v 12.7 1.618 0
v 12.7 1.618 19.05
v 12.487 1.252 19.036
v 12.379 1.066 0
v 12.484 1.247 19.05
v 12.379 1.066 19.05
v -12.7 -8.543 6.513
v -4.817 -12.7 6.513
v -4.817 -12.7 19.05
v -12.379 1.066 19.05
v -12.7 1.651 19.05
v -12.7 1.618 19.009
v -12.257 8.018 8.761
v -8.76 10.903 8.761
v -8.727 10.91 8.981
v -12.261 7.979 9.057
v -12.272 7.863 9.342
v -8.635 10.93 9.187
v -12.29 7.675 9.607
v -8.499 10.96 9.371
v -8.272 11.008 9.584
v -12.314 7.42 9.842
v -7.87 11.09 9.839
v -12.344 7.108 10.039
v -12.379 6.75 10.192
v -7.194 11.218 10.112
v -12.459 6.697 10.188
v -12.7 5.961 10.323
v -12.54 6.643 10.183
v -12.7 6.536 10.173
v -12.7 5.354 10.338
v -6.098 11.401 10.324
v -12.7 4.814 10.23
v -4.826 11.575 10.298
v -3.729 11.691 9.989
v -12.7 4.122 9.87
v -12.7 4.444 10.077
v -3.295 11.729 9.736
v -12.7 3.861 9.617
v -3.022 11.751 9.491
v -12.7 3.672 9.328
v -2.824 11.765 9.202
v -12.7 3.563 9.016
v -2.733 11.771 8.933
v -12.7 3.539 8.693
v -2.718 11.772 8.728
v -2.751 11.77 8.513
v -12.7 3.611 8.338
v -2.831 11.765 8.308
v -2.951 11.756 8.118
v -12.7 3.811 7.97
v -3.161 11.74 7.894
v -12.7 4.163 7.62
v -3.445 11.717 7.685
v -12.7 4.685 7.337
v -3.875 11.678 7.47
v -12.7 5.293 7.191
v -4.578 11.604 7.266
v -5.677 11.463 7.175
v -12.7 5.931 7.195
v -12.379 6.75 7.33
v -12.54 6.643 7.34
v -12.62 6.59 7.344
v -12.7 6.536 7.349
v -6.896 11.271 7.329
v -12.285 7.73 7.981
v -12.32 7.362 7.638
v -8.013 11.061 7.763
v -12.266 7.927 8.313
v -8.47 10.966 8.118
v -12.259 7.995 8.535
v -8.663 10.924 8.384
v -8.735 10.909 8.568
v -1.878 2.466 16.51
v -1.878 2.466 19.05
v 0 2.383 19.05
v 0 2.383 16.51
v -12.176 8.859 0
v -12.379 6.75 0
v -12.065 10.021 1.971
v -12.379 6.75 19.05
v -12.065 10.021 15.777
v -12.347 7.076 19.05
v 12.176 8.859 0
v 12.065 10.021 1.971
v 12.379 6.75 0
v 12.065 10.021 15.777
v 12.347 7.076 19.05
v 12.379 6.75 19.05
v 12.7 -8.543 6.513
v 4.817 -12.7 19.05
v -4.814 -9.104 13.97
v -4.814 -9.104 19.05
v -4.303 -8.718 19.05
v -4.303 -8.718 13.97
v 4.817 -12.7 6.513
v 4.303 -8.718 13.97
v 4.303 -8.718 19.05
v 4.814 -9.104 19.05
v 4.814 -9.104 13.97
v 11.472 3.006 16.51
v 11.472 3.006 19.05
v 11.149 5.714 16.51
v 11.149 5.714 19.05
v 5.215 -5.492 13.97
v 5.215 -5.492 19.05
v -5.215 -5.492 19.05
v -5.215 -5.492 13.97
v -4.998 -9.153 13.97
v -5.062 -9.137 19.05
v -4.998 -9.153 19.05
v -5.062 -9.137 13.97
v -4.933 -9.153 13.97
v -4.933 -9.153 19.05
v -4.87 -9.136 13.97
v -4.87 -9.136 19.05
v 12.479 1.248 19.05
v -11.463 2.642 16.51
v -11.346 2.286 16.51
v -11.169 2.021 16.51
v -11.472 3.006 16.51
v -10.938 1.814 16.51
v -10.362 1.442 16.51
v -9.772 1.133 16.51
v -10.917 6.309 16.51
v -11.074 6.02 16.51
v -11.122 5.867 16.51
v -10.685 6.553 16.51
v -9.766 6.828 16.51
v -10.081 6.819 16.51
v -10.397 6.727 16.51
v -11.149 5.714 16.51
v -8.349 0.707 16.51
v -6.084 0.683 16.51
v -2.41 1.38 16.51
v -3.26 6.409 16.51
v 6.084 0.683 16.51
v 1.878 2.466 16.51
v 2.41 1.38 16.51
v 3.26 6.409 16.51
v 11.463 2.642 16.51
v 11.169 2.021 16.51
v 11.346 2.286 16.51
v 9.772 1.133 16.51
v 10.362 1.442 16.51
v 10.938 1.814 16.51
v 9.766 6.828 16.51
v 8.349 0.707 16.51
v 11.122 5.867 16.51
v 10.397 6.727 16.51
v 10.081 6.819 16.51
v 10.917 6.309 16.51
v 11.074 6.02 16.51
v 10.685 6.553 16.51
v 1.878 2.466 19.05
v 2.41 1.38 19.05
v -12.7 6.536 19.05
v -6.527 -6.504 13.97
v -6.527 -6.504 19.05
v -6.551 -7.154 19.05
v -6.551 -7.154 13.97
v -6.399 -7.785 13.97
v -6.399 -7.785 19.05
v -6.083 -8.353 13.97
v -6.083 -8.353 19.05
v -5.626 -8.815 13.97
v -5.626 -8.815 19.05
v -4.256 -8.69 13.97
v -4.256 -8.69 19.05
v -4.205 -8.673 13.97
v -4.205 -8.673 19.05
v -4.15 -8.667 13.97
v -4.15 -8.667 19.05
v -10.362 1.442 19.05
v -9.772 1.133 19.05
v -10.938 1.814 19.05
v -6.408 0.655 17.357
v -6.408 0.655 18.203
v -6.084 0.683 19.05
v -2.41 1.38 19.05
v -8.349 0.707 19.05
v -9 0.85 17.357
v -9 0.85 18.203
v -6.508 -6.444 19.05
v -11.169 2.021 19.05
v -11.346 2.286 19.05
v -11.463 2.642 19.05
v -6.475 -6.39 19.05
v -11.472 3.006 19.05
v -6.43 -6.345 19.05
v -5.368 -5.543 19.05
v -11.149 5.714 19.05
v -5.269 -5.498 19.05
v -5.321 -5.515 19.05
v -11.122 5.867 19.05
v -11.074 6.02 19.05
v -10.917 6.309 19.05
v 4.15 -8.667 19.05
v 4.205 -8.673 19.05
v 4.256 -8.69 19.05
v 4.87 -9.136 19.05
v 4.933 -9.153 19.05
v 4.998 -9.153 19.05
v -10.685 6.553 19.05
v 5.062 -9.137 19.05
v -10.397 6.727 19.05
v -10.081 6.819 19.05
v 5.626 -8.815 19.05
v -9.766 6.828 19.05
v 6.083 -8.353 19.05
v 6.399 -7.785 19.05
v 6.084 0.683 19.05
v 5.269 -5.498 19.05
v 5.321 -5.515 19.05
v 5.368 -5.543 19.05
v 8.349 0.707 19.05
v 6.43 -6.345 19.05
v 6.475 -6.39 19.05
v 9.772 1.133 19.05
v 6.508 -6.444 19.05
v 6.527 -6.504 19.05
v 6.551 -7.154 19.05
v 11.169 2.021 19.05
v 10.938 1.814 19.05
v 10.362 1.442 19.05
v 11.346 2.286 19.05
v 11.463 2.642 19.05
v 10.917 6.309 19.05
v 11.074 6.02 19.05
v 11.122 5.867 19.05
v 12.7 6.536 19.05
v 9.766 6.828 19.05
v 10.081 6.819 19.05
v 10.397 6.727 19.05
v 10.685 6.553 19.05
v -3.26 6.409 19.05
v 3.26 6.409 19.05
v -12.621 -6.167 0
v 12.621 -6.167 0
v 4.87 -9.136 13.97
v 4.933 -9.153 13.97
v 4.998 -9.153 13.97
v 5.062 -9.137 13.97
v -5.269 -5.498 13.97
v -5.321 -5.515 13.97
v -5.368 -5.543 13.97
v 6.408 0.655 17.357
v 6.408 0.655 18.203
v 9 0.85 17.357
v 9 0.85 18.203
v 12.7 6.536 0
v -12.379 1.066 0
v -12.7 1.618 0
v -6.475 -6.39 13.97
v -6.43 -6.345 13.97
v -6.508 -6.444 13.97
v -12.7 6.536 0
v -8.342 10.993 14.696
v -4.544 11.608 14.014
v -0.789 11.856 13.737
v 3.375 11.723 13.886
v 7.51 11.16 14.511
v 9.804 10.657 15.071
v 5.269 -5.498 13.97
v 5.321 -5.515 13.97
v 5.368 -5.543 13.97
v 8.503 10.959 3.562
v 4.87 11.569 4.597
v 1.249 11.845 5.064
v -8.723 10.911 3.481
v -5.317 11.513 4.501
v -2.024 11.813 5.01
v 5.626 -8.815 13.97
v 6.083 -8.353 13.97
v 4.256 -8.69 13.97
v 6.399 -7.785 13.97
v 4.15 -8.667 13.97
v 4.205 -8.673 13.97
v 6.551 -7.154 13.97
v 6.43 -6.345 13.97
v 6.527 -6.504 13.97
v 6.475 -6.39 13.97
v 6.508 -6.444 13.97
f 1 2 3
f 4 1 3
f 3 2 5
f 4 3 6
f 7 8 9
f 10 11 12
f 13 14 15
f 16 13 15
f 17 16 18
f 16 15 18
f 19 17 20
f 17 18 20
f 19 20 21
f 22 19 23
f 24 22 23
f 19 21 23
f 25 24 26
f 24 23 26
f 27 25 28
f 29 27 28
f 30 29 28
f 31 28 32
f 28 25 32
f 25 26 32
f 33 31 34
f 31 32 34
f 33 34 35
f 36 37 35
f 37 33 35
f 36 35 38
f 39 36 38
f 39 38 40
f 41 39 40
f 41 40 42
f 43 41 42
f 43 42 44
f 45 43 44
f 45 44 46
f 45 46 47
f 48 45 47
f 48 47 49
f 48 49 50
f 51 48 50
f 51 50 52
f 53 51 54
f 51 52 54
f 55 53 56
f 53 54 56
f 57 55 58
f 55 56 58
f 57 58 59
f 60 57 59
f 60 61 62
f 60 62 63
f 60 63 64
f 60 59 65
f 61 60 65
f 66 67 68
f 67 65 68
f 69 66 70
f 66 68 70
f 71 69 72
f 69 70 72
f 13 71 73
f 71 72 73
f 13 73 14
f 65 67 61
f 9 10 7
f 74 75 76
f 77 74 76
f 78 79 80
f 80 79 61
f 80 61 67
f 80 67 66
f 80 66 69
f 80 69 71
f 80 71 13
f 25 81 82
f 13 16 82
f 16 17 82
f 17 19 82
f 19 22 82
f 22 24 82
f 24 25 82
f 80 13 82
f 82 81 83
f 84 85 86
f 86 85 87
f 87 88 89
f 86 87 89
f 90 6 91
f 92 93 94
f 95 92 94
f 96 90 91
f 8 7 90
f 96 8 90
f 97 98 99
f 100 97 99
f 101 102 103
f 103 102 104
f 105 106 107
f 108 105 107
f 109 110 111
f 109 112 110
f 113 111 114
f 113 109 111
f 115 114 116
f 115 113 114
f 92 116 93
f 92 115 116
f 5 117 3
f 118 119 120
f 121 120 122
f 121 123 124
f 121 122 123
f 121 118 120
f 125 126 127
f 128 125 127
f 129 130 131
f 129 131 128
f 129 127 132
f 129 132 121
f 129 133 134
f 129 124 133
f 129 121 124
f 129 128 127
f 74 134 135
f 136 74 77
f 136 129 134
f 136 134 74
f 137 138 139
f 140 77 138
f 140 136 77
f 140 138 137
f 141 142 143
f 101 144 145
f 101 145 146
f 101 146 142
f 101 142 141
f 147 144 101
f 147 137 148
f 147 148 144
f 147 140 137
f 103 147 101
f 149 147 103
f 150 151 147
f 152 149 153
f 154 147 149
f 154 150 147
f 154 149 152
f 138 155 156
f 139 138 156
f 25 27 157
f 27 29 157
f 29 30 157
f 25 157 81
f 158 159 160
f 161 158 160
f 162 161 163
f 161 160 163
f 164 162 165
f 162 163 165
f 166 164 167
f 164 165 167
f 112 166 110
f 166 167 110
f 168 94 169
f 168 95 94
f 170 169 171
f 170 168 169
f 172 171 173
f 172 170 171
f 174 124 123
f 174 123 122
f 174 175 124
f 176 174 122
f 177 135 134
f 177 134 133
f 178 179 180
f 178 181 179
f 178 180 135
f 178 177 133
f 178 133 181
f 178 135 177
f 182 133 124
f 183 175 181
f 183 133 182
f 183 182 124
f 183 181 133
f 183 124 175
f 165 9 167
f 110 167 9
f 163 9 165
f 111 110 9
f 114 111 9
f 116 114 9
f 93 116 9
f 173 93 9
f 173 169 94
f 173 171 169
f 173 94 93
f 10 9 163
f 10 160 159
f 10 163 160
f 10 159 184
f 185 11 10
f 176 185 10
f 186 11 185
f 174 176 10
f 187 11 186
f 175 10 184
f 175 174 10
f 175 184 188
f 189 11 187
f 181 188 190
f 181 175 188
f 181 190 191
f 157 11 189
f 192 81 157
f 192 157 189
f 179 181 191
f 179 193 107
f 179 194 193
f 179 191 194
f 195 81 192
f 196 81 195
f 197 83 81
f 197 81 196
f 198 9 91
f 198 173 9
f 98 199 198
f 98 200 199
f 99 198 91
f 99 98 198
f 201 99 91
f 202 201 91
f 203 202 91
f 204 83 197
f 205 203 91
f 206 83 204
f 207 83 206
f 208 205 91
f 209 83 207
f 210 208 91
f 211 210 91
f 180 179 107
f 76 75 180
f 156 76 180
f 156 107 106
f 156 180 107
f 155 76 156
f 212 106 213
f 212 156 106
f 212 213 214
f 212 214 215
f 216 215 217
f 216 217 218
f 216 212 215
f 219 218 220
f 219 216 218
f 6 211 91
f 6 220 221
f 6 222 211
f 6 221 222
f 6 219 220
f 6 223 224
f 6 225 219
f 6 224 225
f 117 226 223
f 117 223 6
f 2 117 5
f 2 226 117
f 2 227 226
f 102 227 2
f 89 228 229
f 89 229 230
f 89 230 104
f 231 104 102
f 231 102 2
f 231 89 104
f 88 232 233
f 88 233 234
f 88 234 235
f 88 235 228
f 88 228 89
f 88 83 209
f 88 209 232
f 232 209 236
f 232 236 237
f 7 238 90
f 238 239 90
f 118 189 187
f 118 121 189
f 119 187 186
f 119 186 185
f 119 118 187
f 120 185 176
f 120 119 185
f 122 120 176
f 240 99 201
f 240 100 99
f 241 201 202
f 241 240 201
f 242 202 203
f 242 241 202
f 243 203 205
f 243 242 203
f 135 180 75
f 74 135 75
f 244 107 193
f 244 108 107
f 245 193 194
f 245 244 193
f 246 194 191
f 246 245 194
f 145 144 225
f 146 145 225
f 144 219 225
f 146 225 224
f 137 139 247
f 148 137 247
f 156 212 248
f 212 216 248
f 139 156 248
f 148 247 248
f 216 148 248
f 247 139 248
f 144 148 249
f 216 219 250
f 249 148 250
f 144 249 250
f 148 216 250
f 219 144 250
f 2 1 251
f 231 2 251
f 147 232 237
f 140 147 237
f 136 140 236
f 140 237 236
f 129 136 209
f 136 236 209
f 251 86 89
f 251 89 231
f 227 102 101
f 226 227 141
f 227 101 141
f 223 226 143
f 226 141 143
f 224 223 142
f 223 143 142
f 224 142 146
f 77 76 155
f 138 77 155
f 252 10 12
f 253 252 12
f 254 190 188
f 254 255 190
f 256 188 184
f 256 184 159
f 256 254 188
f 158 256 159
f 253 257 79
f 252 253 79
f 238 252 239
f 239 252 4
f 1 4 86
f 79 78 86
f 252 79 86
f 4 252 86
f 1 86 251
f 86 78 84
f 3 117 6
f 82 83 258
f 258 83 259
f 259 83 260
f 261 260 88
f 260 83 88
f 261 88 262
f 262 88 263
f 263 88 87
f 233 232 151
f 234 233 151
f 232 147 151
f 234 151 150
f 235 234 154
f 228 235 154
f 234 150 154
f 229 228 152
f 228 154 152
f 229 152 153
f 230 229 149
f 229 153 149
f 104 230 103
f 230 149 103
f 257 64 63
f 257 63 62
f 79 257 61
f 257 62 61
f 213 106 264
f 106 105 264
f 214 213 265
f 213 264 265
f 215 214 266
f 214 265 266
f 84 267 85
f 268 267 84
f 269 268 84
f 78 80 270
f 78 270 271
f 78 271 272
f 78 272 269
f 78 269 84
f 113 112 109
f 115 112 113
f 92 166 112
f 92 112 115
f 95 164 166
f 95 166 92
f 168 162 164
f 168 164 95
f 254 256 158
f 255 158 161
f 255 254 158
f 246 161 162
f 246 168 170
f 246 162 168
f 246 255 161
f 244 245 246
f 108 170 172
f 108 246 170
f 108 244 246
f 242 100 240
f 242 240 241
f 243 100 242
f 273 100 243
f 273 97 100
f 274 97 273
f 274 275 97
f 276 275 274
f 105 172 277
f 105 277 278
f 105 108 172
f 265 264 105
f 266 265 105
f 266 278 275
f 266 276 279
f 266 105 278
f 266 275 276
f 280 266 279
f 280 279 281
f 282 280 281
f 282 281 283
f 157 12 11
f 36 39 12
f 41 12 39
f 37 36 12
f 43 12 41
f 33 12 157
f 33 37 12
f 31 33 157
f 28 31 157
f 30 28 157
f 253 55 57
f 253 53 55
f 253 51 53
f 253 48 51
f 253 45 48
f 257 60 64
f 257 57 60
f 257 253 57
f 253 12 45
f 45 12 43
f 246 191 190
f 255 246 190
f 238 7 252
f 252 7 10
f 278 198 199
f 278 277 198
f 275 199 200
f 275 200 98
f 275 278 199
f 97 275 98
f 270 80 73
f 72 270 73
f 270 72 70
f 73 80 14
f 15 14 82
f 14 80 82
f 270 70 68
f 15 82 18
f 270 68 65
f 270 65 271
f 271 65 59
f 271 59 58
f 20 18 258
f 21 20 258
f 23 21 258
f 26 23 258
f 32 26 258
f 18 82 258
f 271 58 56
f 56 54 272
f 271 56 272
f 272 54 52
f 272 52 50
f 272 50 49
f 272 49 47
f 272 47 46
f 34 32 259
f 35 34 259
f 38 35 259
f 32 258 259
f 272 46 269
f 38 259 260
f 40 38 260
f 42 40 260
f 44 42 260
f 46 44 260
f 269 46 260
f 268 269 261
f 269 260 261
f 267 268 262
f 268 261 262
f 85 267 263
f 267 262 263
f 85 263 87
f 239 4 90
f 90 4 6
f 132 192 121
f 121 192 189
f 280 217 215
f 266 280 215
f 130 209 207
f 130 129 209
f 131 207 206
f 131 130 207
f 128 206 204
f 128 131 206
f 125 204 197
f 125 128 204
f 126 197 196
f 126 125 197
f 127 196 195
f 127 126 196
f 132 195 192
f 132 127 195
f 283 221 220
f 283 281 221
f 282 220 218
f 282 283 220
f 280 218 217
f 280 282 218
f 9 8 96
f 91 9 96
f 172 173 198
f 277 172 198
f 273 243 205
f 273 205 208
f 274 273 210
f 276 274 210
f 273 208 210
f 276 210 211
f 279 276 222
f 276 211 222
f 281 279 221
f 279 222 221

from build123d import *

# Parameters (mm, degrees)
F0_W      = 25.4
F0_H      = 25.4
F1_DEPTH  = 19.05
F2_W      = 33.1137652975
F2_H      = 28.659734875
F3_DEPTH  = 19.051
F5_DEPTH  = 12.7
F7_DEPTH  = 2.54
F9_DEPTH  = 12.7
F12_DEPTH = 25.4
F15_DEPTH = 25.4
F17_DEPTH = 5.08
F18_R     = 1.27
F20_R     = 1.5875
F21_DEPTH = 12.7
F22_R     = 0.254


with BuildPart() as f1:
    # F0 (on Top) → F1 (new body)
    with BuildSketch(Plane.XY):
        Rectangle(F0_W, F0_H)
    extrude(amount=F1_DEPTH)

    # F2 (on face) → F3 (cut, through all)
    with BuildSketch(Plane.XY.offset(19.05)):
        with Locations((-1.1700320756, 0)):
            Rectangle(F2_W, F2_H)
        with BuildLine():
            ThreePointArc((-12.065, 10.0208269432), (0, 11.8638118431), (12.065, 10.0208269432))
            Line((12.065, 10.0208269432), (12.3786535114, 6.750300061))
            Line((12.3786535114, 6.750300061), (12.7, 6.5362956375))
            Line((12.7, 6.5362956375), (12.7, 1.6182865947))
            Line((12.7, 1.6182865947), (12.3786535114, 1.0663146386))
            Line((12.3786535114, 1.0663146386), (12.7, -8.5426112637))
            Line((12.7, -8.5426112637), (4.8173773102, -12.7))
            Line((4.8173773102, -12.7), (0, -12.7))
            Line((0, -12.7), (-4.8173773102, -12.7))
            Line((-4.8173773102, -12.7), (-12.7, -8.5426112637))
            Line((-12.7, -8.5426112637), (-12.3786535114, 1.0663146386))
            Line((-12.3786535114, 1.0663146386), (-12.7, 1.6182865947))
            Line((-12.7, 1.6182865947), (-12.7, 6.5362956375))
            Line((-12.7, 6.5362956375), (-12.3786535114, 6.750300061))
            Line((-12.3786535114, 6.750300061), (-12.065, 10.0208269432))
        make_face(mode=Mode.SUBTRACT)
    extrude(amount=-F3_DEPTH, mode=Mode.SUBTRACT)

    # F4 (on Right) → F5 (cut, symmetric)
    with BuildSketch(Plane.YZ):
        Polygon((13.4258409962, 23.2345554978), (6.619815249, 19.5569172502), (12.7253746614, 12.7713512629), align=None)
    extrude(amount=F5_DEPTH, both=True, mode=Mode.SUBTRACT)

    # F6 (on face) → F7 (cut)
    with BuildSketch(Plane.XY.offset(19.05)):
        with BuildLine():
            ThreePointArc((11.0015488178, 6.9544261182), (0, 6.3570296668), (-11.0015488178, 6.9544261182))
            Line((-11.0015488178, 6.9544261182), (-11.1053383224, 6.0839187998))
            Line((-11.1053383224, 6.0839187998), (-11.5596242249, 2.2737146355))
            add(Edge.make_bspline(
                [(-2.4099256195, 1.3795604811), (-7.9047118703, 0.0093029614), (-9.4140619773, 0.61575824), (-11.5596242249, 2.2737146355)],
                knots=[0, 0, 0, 0, 0.380461969, 0.380461969, 0.380461969, 0.380461969], degree=3))
            Line((-2.4099256195, 1.3795604811), (-1.8782533274, 2.4663225251))
            Line((-1.8782533274, 2.4663225251), (0, 2.3830392409))
            Line((0, 2.3830392409), (1.8782533274, 2.4663225251))
            Line((1.8782533274, 2.4663225251), (2.4099256195, 1.3795604811))
            add(Edge.make_bspline(
                [(2.4099256195, 1.3795604811), (7.9047118703, 0.0093029614), (9.4140619773, 0.61575824), (11.5596242249, 2.2737146355)],
                knots=[0, 0, 0, 0, 0.380461969, 0.380461969, 0.380461969, 0.380461969], degree=3))
            Line((11.5596242249, 2.2737146355), (11.1053383224, 6.0839187998))
            Line((11.1053383224, 6.0839187998), (11.0015488178, 6.9544261182))
        make_face()
    extrude(amount=-F7_DEPTH, mode=Mode.SUBTRACT)

    # F8 (on Right) → F9 (cut, symmetric)
    with BuildSketch(Plane.YZ):
        Polygon((16.2616688758, -2.9984780122), (12.367782183, 5.9512541629), (7.8229103237, -1.7573904479), align=None)
        Polygon((-14.0263205394, -2.3636263795), (-5.847228691, -0.8765184903), (-8.5426112637, 6.5125478432), (-13.6080719531, 6.5125478432), align=None)
    extrude(amount=F9_DEPTH, both=True, mode=Mode.SUBTRACT)

    # F11 (on 3pt) → F12 (cut)
    with BuildSketch(Plane(origin=(13.5235138631, -7.4279156196, 6.0395065555), x_dir=(-0.409334057, -0.8938834922, -0.1828057224), z_dir=(-0.8161889166, 0.4482993446, -0.3645042525))):
        Polygon((9.3890596181, -6.6504105926), (10.8706550673, 19.4640029222), (-6.7497892305, 22.2047120333), (-12.2956875712, 3.634221619), (-6.1068134382, -4.8245443031), align=None)
    extrude(amount=-F12_DEPTH, mode=Mode.SUBTRACT)

    # F14 (on 3pt) → F15 (cut)
    with BuildSketch(Plane(origin=(-13.5235138631, -7.4279156196, 6.0395065555), x_dir=(0.409334057, -0.8938834922, -0.1828057224), z_dir=(-0.8161889166, -0.4482993446, 0.3645042525))):
        Polygon((12.0957437903, 22.2065132111), (-11.2094106153, 21.0766065866), (-8.9160036296, -5.990778096), (12.0957437903, -5.990778096), align=None)
    extrude(amount=F15_DEPTH, mode=Mode.SUBTRACT)

    # F16 (on face) → F17 (cut)
    with BuildSketch(Plane.XY.offset(19.05)):
        with BuildLine():
            Line((5.2999914624, -5.4918094538), (0, -5.4918094538))
            Line((0, -5.4918094538), (-5.2999914624, -5.4918094538))
            Line((-5.2999914624, -5.4918094538), (-6.5067803222, -6.403681509))
            ThreePointArc((-6.5067803222, -6.403681509), (-6.2496472485, -8.0992009526), (-4.9241394059, -9.1872876037))
            Line((-4.9241394059, -9.1872876037), (-4.2353287011, -8.6668094538))
            Line((-4.2353287011, -8.6668094538), (0, -8.6668094538))
            Line((0, -8.6668094538), (4.2353287011, -8.6668094538))
            Line((4.2353287011, -8.6668094538), (4.9241394059, -9.1872876037))
            ThreePointArc((4.9241394059, -9.1872876037), (6.2496472485, -8.0992009526), (6.5067803222, -6.403681509))
            Line((6.5067803222, -6.403681509), (5.2999914624, -5.4918094538))
        make_face()
    extrude(amount=-F17_DEPTH, mode=Mode.SUBTRACT)

    # F18
    f18_edges = [f1.edges().sort_by_distance(p)[0] for p in [
        (-11.001549, 6.954426, 17.78),
        (11.001549, 6.954426, 17.78),
        (11.559624, 2.273715, 17.78),
        (-11.559624, 2.273715, 17.78),
    ]]
    fillet(f18_edges, radius=F18_R)

    # F20 (on face) → F21 (cut, symmetric)
    with BuildSketch(Plane(origin=(-4.0520275589, -3.3428374331, 0), x_dir=(-0.6363732922, 0.7713812501, 0), z_dir=(0.7713812501, 0.6363732922, 0))):
        with Locations((12.3976198956, 8.7611014023)):
            Circle(F20_R)
    extrude(amount=F21_DEPTH, both=True, mode=Mode.SUBTRACT)

    # F22
    f22_edges = [f1.edges().sort_by_distance(p)[0] for p in [
        (-4.235329, -8.666809, 16.51),
        (-4.924139, -9.187288, 16.51),
        (-6.50678, -6.403682, 16.51),
        (-5.299991, -5.491809, 16.51),
        (4.235329, -8.666809, 16.51),
        (4.924139, -9.187288, 16.51),
        (6.50678, -6.403682, 16.51),
        (5.299991, -5.491809, 16.51),
    ]]
    fillet(f22_edges, radius=F22_R)


solid = f1.part
